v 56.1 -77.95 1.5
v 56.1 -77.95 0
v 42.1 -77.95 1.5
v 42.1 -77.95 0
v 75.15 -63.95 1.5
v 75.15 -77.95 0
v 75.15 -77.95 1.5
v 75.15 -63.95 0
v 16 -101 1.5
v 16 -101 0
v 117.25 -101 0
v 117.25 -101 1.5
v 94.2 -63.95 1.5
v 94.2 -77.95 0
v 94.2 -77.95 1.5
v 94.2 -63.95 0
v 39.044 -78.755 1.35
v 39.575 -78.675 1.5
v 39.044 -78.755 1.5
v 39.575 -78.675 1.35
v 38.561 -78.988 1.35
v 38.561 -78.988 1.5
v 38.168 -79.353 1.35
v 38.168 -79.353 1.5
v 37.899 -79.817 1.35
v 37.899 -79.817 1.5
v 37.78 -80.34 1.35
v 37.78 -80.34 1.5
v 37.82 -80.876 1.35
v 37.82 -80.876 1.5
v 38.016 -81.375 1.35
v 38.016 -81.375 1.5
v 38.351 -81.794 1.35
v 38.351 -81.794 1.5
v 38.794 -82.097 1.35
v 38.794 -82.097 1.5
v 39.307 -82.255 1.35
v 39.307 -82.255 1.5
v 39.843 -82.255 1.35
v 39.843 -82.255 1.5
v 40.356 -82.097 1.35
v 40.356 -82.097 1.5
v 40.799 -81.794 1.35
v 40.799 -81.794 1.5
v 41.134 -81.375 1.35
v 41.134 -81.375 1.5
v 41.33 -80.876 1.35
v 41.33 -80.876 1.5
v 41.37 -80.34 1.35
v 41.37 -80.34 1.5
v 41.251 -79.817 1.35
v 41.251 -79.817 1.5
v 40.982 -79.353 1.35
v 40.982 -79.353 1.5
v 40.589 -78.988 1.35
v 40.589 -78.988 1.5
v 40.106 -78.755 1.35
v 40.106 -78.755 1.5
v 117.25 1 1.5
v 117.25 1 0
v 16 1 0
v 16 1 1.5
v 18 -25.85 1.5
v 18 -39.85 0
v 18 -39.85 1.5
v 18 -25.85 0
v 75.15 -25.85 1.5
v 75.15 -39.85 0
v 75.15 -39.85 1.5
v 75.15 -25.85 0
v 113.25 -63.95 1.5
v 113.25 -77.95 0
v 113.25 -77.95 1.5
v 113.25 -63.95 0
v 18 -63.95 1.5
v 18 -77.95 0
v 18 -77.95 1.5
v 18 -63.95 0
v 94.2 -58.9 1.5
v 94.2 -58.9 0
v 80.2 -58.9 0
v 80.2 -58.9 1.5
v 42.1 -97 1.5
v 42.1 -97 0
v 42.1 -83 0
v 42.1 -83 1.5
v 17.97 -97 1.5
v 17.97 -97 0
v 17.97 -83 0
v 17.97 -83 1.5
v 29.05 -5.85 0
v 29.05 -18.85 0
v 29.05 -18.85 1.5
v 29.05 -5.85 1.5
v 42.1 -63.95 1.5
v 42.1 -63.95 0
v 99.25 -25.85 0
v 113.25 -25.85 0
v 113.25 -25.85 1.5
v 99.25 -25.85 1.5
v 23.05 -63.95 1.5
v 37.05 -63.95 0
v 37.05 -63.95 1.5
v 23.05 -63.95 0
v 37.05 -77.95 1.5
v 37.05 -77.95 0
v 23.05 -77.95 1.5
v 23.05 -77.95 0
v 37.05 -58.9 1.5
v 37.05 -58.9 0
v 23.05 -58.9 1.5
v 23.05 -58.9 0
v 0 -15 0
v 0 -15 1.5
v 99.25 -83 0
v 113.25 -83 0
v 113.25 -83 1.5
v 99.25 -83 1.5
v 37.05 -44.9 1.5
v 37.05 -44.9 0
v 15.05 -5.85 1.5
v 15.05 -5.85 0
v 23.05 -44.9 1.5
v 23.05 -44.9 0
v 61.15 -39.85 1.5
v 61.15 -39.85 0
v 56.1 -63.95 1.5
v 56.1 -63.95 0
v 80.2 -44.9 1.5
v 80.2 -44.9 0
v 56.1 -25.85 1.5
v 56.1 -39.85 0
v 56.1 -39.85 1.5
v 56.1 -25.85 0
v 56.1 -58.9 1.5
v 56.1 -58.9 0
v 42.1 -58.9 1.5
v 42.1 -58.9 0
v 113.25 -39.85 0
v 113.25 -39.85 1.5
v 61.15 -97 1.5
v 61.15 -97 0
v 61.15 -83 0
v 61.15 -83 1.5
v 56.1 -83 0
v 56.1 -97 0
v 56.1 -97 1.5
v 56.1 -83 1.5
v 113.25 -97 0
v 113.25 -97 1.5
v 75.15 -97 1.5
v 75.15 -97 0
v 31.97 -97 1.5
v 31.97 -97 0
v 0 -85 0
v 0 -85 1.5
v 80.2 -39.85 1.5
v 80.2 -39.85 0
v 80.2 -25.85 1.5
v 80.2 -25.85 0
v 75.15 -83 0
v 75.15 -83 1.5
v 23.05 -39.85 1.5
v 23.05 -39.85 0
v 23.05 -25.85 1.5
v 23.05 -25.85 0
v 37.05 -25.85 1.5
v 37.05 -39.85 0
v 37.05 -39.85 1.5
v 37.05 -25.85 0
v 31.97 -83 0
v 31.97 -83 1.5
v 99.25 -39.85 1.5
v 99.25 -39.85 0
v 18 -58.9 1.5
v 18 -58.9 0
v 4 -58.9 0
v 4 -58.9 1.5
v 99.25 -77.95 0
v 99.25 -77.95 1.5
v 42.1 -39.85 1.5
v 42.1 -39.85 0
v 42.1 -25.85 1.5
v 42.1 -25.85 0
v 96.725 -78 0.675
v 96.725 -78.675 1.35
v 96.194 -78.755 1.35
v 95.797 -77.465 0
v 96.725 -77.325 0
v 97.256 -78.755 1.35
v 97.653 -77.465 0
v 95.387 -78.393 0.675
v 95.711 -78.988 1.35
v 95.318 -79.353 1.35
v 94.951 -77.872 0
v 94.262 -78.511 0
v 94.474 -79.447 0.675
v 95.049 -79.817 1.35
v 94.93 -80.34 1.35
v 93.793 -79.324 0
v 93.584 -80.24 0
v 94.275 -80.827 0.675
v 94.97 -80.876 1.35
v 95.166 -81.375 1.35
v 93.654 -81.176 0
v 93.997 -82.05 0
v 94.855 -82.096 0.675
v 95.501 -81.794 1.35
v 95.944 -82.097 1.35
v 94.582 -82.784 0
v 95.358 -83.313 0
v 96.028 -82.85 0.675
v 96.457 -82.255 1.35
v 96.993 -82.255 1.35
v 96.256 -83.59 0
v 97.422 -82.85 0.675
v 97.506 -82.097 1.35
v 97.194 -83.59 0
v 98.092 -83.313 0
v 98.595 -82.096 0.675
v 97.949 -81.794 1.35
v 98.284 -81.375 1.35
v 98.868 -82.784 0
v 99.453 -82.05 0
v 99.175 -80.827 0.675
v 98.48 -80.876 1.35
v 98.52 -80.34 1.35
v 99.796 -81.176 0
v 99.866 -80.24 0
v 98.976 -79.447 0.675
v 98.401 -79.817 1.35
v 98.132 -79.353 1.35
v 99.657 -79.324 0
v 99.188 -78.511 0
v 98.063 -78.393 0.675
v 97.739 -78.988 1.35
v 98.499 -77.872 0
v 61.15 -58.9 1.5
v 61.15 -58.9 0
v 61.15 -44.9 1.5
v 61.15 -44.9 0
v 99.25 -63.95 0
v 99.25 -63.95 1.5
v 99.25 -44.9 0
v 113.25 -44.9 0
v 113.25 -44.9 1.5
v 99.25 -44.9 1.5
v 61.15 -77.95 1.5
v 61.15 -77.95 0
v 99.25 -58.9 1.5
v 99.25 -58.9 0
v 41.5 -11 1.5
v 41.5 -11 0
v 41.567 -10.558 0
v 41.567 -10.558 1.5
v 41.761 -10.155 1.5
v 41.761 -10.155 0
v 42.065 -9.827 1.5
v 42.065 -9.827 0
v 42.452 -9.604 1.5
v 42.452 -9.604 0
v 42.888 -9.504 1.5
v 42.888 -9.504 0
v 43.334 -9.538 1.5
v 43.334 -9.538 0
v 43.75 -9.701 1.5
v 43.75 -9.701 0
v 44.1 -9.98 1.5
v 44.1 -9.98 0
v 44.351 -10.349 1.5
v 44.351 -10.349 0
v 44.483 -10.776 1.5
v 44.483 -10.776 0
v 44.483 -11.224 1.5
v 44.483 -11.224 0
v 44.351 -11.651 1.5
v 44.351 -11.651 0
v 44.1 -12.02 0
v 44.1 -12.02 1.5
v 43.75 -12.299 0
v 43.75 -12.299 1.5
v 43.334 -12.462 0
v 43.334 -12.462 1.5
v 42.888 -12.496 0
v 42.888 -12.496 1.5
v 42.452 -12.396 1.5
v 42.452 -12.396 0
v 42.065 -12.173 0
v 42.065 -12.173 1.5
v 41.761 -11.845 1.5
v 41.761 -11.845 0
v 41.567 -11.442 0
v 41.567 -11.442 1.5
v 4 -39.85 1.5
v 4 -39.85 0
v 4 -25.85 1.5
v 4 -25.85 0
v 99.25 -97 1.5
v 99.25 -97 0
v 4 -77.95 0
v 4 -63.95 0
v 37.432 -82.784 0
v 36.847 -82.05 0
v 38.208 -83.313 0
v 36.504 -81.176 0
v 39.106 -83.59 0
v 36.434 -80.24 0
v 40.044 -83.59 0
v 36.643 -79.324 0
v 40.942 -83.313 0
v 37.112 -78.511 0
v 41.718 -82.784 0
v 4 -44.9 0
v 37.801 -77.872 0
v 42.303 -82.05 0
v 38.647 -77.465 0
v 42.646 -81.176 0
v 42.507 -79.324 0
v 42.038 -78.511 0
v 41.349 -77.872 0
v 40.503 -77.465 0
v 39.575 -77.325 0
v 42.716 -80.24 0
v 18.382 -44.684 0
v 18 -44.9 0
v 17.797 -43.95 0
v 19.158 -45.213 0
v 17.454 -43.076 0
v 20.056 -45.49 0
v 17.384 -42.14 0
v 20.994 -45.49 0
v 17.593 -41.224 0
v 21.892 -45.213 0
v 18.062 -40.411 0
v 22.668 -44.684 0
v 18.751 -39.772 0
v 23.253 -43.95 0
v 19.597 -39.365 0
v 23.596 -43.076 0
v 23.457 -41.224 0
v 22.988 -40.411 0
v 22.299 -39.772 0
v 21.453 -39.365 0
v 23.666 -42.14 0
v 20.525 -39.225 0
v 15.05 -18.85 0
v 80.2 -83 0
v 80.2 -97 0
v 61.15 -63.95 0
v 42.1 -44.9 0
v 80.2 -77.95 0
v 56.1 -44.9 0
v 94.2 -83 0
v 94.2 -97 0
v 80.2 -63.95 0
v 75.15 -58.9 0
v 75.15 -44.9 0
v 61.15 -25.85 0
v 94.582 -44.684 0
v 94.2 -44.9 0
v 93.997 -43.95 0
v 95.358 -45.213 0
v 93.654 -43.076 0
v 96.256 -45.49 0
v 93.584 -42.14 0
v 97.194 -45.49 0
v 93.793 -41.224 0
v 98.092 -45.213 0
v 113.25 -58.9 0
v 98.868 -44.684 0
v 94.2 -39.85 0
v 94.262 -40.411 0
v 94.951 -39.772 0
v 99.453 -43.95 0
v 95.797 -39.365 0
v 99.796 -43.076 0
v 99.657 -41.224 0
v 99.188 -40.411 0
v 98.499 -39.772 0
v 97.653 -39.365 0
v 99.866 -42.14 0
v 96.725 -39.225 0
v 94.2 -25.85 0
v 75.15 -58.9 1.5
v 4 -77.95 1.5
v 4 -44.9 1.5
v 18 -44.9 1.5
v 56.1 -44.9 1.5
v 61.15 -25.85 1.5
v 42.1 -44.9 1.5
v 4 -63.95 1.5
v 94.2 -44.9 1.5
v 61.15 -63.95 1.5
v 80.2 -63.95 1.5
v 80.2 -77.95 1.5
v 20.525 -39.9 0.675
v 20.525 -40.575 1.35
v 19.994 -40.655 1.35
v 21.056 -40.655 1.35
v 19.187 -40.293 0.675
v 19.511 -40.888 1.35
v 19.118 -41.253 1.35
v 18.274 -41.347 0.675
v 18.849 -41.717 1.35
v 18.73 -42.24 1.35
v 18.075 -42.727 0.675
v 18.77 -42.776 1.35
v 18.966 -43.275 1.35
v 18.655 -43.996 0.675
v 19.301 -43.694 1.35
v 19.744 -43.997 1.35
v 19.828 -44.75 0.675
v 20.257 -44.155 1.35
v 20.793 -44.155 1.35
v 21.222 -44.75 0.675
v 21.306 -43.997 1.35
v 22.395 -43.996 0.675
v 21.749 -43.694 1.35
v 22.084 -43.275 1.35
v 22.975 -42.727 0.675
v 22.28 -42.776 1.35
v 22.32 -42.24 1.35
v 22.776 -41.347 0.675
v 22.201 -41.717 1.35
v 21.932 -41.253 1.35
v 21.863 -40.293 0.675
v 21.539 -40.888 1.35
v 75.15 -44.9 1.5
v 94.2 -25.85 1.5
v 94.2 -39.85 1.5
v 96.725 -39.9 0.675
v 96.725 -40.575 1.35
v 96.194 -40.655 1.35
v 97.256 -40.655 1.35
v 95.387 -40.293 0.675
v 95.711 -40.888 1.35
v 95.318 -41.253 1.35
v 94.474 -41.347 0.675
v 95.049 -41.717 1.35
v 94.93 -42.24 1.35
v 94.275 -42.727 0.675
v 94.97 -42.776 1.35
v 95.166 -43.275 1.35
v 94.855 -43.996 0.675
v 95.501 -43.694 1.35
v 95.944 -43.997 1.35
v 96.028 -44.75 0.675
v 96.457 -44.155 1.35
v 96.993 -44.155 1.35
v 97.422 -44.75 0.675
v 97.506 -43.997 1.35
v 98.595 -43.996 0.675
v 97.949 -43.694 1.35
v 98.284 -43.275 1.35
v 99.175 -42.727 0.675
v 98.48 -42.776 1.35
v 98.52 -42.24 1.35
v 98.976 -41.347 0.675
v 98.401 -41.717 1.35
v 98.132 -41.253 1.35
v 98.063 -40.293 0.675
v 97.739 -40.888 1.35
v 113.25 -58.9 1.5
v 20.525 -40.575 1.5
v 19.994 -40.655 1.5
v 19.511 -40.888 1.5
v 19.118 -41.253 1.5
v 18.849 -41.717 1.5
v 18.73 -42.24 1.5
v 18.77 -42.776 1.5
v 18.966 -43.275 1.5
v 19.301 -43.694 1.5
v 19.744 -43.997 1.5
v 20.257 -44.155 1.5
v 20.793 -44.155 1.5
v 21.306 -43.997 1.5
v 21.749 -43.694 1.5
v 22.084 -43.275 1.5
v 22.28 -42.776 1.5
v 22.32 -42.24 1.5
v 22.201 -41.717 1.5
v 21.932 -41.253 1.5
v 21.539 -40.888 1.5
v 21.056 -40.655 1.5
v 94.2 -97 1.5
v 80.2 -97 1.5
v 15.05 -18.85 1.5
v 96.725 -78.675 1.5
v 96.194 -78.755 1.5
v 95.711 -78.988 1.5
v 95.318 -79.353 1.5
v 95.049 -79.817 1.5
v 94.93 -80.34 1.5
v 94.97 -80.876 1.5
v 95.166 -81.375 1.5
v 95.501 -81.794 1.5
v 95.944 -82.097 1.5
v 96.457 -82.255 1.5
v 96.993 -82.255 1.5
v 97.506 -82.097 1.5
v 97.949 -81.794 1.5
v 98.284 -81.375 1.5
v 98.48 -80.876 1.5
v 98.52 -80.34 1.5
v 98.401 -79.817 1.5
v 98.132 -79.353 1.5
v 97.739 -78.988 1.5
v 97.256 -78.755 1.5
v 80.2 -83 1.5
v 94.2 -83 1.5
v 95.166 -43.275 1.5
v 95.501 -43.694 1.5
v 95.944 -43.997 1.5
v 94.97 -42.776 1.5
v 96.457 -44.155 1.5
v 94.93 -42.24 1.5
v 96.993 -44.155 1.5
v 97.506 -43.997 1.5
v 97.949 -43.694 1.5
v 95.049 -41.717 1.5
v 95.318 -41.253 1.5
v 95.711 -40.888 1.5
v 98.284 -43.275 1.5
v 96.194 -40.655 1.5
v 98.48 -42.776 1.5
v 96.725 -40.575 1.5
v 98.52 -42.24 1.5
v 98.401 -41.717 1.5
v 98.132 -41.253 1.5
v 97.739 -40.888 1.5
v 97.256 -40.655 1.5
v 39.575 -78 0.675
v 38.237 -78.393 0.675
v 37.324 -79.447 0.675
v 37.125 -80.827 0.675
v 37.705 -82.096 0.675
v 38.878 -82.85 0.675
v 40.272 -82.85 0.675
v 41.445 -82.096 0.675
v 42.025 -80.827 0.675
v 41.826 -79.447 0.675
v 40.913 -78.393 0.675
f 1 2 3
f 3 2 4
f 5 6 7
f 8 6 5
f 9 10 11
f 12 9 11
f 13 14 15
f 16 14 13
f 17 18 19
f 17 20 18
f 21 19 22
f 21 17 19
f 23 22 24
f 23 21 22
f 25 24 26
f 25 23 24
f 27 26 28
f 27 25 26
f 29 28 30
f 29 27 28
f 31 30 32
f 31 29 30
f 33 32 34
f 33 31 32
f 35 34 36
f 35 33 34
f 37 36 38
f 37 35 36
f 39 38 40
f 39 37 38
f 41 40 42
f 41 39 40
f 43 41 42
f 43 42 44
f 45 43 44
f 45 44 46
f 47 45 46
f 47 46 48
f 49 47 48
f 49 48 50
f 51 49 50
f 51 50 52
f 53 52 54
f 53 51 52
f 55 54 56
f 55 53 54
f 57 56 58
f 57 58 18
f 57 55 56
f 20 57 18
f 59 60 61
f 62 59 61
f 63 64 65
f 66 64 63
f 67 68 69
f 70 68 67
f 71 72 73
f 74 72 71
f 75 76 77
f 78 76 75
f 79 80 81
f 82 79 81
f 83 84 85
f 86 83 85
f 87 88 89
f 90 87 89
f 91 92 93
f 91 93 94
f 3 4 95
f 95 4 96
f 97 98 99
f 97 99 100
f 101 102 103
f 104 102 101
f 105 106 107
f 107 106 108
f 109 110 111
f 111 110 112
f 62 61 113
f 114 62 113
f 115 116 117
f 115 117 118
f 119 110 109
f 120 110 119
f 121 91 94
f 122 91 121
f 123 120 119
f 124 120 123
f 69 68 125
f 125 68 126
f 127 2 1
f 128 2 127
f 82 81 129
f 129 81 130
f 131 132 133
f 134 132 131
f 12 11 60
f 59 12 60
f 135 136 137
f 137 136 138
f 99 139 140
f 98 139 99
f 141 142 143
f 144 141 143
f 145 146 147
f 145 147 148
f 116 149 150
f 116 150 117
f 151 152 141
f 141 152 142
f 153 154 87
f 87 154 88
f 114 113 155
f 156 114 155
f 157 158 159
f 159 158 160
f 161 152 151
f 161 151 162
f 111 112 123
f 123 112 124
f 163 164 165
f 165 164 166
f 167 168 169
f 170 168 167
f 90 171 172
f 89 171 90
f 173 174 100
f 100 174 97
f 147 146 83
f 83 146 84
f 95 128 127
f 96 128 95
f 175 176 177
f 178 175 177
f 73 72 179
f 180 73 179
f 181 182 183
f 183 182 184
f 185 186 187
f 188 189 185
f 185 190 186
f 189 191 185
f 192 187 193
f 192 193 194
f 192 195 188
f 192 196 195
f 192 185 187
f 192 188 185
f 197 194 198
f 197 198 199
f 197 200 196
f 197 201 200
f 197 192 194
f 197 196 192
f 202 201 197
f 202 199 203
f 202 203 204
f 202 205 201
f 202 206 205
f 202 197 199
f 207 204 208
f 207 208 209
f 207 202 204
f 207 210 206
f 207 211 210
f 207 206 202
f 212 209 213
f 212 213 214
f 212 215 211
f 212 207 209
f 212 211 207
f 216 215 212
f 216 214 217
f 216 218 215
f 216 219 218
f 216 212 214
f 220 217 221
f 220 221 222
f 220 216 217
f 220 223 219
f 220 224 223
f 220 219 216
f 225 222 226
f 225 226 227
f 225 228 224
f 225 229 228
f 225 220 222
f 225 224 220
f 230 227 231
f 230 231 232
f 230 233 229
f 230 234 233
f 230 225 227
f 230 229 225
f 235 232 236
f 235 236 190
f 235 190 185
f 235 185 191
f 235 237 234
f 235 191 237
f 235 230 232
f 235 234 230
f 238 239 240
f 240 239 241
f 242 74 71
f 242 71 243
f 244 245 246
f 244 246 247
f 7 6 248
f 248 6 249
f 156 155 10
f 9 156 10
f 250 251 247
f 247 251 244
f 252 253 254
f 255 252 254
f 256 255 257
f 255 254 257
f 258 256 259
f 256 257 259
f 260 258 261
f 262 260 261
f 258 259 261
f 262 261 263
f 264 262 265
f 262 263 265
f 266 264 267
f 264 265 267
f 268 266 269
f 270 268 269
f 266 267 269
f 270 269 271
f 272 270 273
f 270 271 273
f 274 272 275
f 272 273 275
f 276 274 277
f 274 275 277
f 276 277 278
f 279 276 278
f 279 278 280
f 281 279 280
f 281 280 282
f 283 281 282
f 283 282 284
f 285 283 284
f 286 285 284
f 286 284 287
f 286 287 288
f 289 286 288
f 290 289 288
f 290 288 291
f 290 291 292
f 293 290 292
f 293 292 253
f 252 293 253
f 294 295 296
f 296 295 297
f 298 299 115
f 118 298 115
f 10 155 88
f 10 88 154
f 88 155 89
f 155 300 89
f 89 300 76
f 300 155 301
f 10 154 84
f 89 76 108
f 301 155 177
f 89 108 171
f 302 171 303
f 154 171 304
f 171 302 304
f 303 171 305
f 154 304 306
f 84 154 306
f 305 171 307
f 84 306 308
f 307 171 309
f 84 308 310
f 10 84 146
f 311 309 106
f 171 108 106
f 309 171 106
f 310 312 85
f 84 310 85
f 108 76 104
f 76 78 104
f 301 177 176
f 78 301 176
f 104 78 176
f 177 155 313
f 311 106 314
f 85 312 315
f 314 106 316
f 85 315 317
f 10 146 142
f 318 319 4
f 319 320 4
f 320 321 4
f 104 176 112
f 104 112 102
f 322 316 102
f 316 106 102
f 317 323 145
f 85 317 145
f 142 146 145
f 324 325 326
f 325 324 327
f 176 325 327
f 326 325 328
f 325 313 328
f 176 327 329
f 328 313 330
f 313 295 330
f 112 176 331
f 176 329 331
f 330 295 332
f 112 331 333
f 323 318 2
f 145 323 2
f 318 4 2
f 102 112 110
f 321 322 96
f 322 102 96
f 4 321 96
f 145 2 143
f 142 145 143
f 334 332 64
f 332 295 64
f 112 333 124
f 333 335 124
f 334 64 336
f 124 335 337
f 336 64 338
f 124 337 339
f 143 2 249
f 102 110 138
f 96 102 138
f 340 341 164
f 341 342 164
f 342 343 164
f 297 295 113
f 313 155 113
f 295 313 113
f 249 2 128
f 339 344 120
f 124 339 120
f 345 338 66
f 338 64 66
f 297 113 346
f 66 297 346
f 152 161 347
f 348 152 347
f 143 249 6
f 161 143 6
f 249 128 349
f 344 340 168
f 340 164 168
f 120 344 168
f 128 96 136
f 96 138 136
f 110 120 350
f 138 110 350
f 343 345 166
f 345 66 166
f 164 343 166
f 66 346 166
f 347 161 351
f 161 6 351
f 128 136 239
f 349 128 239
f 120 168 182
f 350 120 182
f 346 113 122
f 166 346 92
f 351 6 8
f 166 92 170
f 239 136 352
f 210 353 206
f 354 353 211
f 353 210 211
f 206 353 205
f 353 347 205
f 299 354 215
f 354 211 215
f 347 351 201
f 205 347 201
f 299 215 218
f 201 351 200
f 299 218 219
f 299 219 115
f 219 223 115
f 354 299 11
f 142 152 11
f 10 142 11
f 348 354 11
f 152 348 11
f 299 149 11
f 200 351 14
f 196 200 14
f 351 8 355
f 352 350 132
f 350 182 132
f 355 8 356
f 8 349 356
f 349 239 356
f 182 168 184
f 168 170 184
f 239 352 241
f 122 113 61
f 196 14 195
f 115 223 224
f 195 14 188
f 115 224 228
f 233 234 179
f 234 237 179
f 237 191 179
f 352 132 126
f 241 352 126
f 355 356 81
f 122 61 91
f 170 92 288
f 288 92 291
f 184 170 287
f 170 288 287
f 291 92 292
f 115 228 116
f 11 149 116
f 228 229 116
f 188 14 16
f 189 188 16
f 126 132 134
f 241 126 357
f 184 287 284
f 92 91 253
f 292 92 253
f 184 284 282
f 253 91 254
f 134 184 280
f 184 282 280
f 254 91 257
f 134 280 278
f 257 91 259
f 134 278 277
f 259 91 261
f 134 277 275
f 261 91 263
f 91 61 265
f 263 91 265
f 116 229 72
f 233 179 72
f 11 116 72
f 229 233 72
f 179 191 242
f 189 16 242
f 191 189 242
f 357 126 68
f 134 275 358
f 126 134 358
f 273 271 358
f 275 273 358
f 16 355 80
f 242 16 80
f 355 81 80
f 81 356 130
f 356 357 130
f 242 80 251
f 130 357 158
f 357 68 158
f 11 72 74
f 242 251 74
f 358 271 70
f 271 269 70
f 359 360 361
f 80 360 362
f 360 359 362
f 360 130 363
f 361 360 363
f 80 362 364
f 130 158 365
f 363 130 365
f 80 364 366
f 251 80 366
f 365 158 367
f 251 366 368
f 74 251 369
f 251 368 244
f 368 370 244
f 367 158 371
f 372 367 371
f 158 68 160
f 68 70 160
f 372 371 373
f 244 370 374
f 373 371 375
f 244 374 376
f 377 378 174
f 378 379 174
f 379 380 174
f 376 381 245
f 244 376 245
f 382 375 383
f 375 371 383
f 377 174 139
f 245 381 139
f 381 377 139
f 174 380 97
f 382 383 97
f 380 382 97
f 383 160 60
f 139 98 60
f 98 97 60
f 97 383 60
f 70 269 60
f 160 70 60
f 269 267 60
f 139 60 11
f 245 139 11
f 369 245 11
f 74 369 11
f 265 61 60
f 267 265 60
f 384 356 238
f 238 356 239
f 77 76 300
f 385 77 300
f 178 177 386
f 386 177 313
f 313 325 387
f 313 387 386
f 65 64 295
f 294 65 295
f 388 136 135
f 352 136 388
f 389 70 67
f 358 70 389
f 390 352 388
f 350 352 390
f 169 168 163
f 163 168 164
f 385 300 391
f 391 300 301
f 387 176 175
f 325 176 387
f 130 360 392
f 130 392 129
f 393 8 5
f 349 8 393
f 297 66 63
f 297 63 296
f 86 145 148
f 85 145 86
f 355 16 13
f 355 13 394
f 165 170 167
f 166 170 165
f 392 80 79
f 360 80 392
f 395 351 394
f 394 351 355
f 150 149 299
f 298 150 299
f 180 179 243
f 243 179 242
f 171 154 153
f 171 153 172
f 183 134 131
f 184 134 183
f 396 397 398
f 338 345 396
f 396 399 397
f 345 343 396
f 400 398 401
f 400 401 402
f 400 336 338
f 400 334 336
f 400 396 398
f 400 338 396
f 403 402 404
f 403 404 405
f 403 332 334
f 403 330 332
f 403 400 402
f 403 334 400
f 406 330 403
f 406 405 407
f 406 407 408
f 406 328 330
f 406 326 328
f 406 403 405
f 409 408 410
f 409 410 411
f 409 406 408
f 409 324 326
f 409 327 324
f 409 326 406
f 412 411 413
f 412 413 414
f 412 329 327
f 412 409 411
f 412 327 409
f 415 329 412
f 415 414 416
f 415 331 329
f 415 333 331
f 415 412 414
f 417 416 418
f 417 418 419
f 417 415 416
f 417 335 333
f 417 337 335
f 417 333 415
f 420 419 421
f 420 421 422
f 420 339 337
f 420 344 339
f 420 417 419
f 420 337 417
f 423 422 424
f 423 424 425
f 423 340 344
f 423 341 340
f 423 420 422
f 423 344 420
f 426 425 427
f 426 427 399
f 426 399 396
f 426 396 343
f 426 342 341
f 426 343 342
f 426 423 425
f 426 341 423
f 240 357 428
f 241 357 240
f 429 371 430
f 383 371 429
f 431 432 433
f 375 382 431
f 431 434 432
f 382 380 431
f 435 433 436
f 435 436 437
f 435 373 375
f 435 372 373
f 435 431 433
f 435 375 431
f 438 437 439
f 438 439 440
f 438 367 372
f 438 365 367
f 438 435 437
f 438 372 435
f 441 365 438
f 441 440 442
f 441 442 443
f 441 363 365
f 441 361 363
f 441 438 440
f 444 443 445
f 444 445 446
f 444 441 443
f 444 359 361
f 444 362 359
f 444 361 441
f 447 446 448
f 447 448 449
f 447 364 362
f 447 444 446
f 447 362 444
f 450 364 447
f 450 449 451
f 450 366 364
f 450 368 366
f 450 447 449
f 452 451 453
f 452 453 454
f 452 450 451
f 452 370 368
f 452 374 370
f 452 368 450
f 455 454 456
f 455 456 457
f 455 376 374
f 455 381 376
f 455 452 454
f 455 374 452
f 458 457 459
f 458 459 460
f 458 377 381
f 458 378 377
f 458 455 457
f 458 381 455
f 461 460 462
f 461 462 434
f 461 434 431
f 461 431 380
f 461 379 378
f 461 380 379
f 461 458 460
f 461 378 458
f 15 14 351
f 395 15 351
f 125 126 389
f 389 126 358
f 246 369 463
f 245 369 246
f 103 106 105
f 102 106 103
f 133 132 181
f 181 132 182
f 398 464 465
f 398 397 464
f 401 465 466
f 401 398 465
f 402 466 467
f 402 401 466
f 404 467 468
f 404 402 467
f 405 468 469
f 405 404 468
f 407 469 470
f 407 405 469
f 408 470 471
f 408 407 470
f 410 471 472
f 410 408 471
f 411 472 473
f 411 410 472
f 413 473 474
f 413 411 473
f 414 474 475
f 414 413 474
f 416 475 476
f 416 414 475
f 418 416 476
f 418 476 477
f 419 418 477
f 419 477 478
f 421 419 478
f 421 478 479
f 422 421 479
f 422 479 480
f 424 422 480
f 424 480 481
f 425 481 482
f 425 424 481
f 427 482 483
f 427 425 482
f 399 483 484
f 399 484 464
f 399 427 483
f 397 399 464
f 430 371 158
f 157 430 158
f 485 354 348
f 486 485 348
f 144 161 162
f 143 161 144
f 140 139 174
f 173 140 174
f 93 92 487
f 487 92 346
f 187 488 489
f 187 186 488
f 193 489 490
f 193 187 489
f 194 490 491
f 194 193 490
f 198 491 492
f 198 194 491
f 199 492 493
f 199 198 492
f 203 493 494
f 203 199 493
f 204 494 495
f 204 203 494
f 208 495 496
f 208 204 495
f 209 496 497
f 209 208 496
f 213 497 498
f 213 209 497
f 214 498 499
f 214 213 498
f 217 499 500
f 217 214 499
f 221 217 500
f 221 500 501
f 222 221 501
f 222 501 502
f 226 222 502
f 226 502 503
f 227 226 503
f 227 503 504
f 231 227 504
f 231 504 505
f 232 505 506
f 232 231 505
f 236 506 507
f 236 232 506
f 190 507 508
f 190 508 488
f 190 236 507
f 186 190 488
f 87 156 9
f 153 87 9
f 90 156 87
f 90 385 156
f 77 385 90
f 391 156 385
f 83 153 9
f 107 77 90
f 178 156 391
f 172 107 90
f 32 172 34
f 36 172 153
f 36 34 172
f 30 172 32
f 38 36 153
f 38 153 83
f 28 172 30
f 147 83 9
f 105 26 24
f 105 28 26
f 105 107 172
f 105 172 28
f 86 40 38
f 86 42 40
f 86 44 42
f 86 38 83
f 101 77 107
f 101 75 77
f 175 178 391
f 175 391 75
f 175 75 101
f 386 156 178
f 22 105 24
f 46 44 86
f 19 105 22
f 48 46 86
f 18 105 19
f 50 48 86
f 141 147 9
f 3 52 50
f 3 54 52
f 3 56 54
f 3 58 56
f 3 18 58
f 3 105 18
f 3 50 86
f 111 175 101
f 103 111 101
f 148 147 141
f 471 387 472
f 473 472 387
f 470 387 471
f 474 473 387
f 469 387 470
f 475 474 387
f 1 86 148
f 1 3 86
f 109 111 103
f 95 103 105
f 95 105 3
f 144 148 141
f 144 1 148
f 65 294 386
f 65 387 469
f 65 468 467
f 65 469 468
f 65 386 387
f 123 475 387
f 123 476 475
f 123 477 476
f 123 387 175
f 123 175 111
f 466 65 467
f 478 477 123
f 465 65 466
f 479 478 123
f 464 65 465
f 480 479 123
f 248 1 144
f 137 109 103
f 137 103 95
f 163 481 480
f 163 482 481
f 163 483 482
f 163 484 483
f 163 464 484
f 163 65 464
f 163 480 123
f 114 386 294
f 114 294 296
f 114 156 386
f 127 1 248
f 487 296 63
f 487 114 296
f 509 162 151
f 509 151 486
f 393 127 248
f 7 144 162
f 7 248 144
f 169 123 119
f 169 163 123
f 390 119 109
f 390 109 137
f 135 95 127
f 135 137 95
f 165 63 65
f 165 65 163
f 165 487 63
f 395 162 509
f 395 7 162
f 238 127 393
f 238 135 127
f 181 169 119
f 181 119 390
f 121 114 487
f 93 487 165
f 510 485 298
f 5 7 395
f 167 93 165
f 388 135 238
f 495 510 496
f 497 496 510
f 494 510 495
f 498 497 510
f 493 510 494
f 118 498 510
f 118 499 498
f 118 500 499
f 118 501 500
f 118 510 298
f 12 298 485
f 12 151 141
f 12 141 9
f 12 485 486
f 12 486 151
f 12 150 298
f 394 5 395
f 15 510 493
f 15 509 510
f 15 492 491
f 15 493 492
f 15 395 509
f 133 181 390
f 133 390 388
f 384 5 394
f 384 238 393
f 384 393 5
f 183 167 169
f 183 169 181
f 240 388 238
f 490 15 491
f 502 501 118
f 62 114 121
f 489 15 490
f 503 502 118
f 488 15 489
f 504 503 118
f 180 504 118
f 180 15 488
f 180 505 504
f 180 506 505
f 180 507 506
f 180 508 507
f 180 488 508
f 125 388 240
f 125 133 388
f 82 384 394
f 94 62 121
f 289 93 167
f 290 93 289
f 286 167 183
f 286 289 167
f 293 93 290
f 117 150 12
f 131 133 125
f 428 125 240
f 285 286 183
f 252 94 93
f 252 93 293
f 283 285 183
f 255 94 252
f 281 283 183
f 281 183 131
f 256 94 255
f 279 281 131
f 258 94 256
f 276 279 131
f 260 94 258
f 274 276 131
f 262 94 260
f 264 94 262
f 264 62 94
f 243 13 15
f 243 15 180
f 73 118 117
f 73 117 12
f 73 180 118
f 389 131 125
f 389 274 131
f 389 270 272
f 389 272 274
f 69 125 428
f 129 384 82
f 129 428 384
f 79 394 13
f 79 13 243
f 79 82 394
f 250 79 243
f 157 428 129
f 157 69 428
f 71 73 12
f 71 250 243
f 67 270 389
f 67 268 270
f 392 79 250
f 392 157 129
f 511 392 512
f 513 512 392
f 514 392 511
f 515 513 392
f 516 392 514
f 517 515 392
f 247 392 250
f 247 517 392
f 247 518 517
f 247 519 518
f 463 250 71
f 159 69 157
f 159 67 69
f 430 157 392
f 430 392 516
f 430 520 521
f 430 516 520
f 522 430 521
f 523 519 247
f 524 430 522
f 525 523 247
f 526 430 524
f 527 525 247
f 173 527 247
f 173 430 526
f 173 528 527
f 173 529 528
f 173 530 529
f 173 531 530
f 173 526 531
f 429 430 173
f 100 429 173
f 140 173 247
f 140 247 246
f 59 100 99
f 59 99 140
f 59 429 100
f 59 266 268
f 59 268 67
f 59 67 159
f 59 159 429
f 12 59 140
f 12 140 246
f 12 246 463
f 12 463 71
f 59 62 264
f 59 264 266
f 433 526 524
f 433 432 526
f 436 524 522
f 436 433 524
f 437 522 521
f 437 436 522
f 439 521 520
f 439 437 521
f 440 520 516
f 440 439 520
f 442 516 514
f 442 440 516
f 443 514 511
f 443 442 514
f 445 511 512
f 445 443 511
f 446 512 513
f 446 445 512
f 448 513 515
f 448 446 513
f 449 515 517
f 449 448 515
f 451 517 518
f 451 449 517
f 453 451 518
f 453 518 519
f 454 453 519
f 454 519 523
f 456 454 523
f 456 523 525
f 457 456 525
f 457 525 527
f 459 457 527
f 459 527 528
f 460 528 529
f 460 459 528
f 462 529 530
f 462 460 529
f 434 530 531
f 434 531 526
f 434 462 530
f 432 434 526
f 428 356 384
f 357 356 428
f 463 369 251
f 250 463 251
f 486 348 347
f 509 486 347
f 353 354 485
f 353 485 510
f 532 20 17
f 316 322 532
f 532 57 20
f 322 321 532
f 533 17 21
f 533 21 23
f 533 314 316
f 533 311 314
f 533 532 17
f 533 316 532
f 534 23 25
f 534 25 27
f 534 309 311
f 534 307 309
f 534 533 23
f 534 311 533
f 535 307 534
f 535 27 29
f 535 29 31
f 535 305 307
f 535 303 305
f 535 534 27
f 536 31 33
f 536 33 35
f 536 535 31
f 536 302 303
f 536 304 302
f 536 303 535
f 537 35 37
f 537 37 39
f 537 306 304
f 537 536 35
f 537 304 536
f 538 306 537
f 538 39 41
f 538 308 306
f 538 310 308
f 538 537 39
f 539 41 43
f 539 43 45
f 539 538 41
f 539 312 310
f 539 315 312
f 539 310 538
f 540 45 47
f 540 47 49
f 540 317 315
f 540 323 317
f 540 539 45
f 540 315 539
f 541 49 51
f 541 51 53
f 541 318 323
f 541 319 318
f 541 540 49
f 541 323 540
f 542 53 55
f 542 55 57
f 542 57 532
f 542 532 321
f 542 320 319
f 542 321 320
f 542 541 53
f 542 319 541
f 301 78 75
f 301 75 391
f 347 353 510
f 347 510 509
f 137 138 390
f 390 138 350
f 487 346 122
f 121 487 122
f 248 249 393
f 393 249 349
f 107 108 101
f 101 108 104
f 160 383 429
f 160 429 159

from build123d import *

# Parameters (mm, degrees)
BOSS_EXTRU_1_DEPTH                          = 1.5
ESQUISSE3_R                                 = 1.5
ESQUISSE3_W                                 = 14
ESQUISSE3_H                                 = 14
ESQUISSE3_H_2                               = 13
ENL_V_MAT_EXTRU_2_DEPTH                     = 10
FRAISAGE_POUR_VIS_T_TE_FRAIS_E_M31_AT_COUNT = 2
FRAISAGE_POUR_VIS_T_TE_FRAIS_E_M31_AT_PITCH = 38.1
FRAISAGE_POUR_VIS_T_TE_FRAIS_E_M31_2_COUNT  = 2
FRAISAGE_POUR_VIS_T_TE_FRAIS_E_M31_2_PITCH  = 76.2
FRAISAGE_POUR_VIS_T_TE_FRAIS_E_M31_3_COUNT  = 2
FRAISAGE_POUR_VIS_T_TE_FRAIS_E_M31_3_PITCH  = 68.685751798


with BuildPart() as part:
    # Esquisse1 → Boss.-Extru.1 (new body)
    with BuildSketch(Plane.XY):
        Polygon((0, -85), (16, -101), (117.25, -101), (117.25, 1), (16, 1), (0, -15), align=None)
    extrude(amount=BOSS_EXTRU_1_DEPTH)

    # Esquisse3 → Enlèv. mat.-Extru.2 (cut)
    with BuildSketch(Plane(origin=(0, 0, 0), x_dir=(-1, 0, 0), z_dir=(0, 0, -1))):
        with Locations((-43, -11)):
            Circle(ESQUISSE3_R)
        with Locations((-87.2, -32.85)):
            Rectangle(ESQUISSE3_W, ESQUISSE3_H)
        with Locations((-106.25, -32.85)):
            Rectangle(ESQUISSE3_W, ESQUISSE3_H)
        with Locations((-68.15, -32.85)):
            Rectangle(ESQUISSE3_W, ESQUISSE3_H)
        with Locations((-49.1, -32.85)):
            Rectangle(ESQUISSE3_W, ESQUISSE3_H)
        with Locations((-30.05, -32.85)):
            Rectangle(ESQUISSE3_W, ESQUISSE3_H)
        with Locations((-11, -32.85)):
            Rectangle(ESQUISSE3_W, ESQUISSE3_H)
        with Locations((-87.2, -51.9)):
            Rectangle(ESQUISSE3_W, ESQUISSE3_H)
        with Locations((-68.15, -51.9)):
            Rectangle(ESQUISSE3_W, ESQUISSE3_H)
        with Locations((-49.1, -51.9)):
            Rectangle(ESQUISSE3_W, ESQUISSE3_H)
        with Locations((-30.05, -51.9)):
            Rectangle(ESQUISSE3_W, ESQUISSE3_H)
        with Locations((-11, -51.9)):
            Rectangle(ESQUISSE3_W, ESQUISSE3_H)
        with Locations((-87.2, -70.95)):
            Rectangle(ESQUISSE3_W, ESQUISSE3_H)
        with Locations((-68.15, -70.95)):
            Rectangle(ESQUISSE3_W, ESQUISSE3_H)
        with Locations((-49.1, -70.95)):
            Rectangle(ESQUISSE3_W, ESQUISSE3_H)
        with Locations((-30.05, -70.95)):
            Rectangle(ESQUISSE3_W, ESQUISSE3_H)
        with Locations((-11, -70.95)):
            Rectangle(ESQUISSE3_W, ESQUISSE3_H)
        with Locations((-87.2, -90)):
            Rectangle(ESQUISSE3_W, ESQUISSE3_H)
        with Locations((-68.15, -90)):
            Rectangle(ESQUISSE3_W, ESQUISSE3_H)
        with Locations((-49.1, -90)):
            Rectangle(ESQUISSE3_W, ESQUISSE3_H)
        with Locations((-106.25, -51.9)):
            Rectangle(ESQUISSE3_W, ESQUISSE3_H)
        with Locations((-106.25, -70.95)):
            Rectangle(ESQUISSE3_W, ESQUISSE3_H)
        with Locations((-106.25, -90)):
            Rectangle(ESQUISSE3_W, ESQUISSE3_H)
        with Locations((-24.97, -90)):
            Rectangle(ESQUISSE3_W, ESQUISSE3_H)
        with Locations((-22.05, -12.35)):
            Rectangle(ESQUISSE3_W, ESQUISSE3_H_2)
    extrude(amount=-ENL_V_MAT_EXTRU_2_DEPTH, mode=Mode.SUBTRACT)

    # Esquisse6 → Fraisage pour vis à tête fraisée M31 (revolve, cut)
    with BuildSketch(Plane(origin=(96.725, -42.375, 0), x_dir=(0, 1, 0), z_dir=(1, 0, 0))):
        Polygon((0, 0), (0, 1.5), (1.8, 1.5), (1.8, 1.35), (3.15, 0), align=None)
    fraisage_pour_vis_t_te_frais_e_m31 = revolve(axis=Axis((96.725, -42.375, -6.35), (0, 0, 1)), mode=Mode.SUBTRACT)

    # Fraisage pour vis à tête fraisée M31 at: Fraisage pour vis à tête fraisée M31 ×2
    with Locations(*[(0, -i * FRAISAGE_POUR_VIS_T_TE_FRAIS_E_M31_AT_PITCH, 0) for i in range(1, FRAISAGE_POUR_VIS_T_TE_FRAIS_E_M31_AT_COUNT)]):
        add(fraisage_pour_vis_t_te_frais_e_m31, mode=Mode.SUBTRACT)

    # Fraisage pour vis _ t_te frais_e M31 2: Fraisage pour vis à tête fraisée M31 ×2
    with Locations(*[(-i * FRAISAGE_POUR_VIS_T_TE_FRAIS_E_M31_2_PITCH, 0, 0) for i in range(1, FRAISAGE_POUR_VIS_T_TE_FRAIS_E_M31_2_COUNT)]):
        add(fraisage_pour_vis_t_te_frais_e_m31, mode=Mode.SUBTRACT)

    # Fraisage pour vis _ t_te frais_e M31 3: Fraisage pour vis à tête fraisée M31 ×2
    with Locations(*[Vector(-0.832050294, -0.554700196, 0) * (i * FRAISAGE_POUR_VIS_T_TE_FRAIS_E_M31_3_PITCH) for i in range(1, FRAISAGE_POUR_VIS_T_TE_FRAIS_E_M31_3_COUNT)]):
        add(fraisage_pour_vis_t_te_frais_e_m31, mode=Mode.SUBTRACT)


solid = part.part
